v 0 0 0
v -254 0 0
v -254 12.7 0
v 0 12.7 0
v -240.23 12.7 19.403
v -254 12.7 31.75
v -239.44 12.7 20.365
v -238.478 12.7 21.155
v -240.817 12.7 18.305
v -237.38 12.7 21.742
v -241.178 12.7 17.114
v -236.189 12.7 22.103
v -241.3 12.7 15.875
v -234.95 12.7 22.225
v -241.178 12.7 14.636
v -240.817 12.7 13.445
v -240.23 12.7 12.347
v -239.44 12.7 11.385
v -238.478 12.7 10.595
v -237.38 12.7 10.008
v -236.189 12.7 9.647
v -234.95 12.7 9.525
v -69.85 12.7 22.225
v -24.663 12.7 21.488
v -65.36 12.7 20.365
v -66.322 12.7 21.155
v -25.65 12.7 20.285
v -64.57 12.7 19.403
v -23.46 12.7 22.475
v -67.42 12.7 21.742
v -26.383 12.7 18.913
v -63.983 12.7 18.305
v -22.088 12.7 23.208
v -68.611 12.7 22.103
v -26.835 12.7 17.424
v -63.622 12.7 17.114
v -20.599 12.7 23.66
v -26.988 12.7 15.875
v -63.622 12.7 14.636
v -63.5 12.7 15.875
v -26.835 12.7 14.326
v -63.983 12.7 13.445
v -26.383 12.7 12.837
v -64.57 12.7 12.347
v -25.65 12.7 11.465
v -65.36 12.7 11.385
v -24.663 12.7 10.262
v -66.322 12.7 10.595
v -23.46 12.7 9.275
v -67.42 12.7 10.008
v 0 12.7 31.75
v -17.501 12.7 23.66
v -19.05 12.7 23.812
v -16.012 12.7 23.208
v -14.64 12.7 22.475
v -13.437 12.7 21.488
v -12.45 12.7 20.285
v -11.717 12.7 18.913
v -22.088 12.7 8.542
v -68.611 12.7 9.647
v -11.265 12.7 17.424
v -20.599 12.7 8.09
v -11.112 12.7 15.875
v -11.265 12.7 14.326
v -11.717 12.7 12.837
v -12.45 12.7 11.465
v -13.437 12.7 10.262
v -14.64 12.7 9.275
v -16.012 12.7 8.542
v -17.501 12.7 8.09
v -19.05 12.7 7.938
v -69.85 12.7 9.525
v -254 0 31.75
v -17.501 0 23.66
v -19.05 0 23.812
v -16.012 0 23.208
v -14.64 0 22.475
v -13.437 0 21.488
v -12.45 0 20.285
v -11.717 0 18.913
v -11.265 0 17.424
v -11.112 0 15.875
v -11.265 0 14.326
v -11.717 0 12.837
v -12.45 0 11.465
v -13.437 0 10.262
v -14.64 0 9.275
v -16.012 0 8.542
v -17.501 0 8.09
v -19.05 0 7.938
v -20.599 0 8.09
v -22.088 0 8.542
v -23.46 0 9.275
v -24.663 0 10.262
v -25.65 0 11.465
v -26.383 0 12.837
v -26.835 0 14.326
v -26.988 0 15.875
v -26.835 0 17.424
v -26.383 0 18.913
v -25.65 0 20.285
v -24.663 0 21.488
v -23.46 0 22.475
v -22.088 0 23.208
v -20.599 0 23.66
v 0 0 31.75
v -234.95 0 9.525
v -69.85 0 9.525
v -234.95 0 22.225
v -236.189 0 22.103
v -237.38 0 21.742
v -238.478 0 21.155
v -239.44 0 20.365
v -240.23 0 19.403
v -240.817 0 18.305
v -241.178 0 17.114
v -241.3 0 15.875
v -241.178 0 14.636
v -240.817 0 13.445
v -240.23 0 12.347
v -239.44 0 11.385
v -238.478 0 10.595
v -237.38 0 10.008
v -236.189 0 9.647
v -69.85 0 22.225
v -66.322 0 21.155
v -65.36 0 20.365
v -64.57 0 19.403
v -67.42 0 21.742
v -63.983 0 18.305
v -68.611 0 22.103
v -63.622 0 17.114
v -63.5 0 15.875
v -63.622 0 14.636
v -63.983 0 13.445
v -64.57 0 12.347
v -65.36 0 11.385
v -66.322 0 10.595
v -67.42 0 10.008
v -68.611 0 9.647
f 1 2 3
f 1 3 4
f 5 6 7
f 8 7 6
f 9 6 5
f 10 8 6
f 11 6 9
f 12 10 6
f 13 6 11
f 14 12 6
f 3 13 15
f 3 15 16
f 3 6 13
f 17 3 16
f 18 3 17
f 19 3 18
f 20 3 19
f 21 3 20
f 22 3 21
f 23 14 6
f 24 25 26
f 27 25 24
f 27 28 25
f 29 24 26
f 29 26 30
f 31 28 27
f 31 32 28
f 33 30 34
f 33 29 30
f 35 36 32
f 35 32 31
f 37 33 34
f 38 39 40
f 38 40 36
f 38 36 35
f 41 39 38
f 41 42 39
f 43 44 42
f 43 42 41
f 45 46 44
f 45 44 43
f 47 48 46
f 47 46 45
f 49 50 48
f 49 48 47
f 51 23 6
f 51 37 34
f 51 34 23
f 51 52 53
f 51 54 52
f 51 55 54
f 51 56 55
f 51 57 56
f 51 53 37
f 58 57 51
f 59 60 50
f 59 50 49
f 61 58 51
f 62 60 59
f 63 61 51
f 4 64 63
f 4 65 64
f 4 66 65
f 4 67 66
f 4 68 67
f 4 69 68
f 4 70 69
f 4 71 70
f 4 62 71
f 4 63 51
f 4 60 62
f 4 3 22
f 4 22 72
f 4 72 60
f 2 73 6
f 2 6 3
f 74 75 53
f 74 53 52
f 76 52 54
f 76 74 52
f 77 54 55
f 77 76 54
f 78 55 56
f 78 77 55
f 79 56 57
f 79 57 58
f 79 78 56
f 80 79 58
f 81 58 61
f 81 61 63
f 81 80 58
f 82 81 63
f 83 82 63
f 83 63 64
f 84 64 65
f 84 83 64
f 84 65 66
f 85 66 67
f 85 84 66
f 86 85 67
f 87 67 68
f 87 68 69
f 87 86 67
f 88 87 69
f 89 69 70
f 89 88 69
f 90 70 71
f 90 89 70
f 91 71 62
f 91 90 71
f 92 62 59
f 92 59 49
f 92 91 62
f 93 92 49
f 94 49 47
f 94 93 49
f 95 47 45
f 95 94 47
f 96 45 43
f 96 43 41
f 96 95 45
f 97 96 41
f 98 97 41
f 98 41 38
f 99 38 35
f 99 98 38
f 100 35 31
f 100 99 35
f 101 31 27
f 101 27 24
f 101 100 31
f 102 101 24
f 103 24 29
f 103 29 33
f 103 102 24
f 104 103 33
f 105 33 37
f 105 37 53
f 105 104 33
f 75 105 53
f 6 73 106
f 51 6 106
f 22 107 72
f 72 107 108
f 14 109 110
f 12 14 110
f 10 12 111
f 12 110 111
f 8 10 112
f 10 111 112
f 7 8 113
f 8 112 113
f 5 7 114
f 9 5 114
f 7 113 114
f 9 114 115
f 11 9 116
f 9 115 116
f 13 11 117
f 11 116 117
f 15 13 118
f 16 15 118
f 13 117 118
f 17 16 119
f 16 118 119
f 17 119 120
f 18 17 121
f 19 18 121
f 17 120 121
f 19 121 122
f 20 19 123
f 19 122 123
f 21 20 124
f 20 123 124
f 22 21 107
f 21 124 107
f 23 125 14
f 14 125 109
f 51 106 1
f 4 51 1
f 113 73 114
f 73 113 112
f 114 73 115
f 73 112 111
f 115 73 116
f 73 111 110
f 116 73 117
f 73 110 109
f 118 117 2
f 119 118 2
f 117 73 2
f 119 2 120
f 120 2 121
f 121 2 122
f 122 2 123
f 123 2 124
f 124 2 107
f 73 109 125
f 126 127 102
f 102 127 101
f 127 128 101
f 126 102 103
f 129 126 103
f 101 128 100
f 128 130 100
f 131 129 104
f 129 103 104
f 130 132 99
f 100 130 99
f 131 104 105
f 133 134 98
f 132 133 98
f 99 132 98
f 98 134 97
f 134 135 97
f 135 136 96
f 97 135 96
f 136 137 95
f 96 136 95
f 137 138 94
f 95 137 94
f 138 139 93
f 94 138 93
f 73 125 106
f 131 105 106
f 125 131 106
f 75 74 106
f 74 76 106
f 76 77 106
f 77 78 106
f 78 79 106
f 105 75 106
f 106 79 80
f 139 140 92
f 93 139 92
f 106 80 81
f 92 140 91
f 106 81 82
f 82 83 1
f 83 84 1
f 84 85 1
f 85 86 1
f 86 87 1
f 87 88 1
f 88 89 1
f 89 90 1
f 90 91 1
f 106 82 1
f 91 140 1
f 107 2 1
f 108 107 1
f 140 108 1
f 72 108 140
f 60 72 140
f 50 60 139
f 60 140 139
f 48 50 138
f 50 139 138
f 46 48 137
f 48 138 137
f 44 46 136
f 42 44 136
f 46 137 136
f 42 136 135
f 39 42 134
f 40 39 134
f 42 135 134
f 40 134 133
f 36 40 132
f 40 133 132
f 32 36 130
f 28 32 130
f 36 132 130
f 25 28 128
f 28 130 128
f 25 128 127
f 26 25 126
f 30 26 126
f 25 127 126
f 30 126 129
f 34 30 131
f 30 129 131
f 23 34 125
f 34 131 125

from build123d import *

# Parameters (mm, degrees)
SKETCH1_W           = 254
SKETCH1_H           = 31.75
SKETCH1_R           = 7.9375
BOSS_EXTRUDE1_DEPTH = 12.7


with BuildPart() as part:
    # Sketch1 → Boss-Extrude1 (new body)
    with BuildSketch(Plane(origin=(0, 0, 0), x_dir=(1, 0, 0), z_dir=(0, 1, 0))):
        with Locations((-127, -15.875)):
            Rectangle(SKETCH1_W, SKETCH1_H)
        with Locations(Location((-19.05, -15.875, 0), (0, 0, 270))):
            Circle(SKETCH1_R, mode=Mode.SUBTRACT)
        with BuildLine():
            Line((-234.95, -9.525), (-69.85, -9.525))
            ThreePointArc((-69.85, -9.525), (-63.5, -15.875), (-69.85, -22.225))
            Line((-69.85, -22.225), (-234.95, -22.225))
            ThreePointArc((-234.95, -22.225), (-241.3, -15.875), (-234.95, -9.525))
        make_face(mode=Mode.SUBTRACT)
    extrude(amount=BOSS_EXTRUDE1_DEPTH)


solid = part.part
